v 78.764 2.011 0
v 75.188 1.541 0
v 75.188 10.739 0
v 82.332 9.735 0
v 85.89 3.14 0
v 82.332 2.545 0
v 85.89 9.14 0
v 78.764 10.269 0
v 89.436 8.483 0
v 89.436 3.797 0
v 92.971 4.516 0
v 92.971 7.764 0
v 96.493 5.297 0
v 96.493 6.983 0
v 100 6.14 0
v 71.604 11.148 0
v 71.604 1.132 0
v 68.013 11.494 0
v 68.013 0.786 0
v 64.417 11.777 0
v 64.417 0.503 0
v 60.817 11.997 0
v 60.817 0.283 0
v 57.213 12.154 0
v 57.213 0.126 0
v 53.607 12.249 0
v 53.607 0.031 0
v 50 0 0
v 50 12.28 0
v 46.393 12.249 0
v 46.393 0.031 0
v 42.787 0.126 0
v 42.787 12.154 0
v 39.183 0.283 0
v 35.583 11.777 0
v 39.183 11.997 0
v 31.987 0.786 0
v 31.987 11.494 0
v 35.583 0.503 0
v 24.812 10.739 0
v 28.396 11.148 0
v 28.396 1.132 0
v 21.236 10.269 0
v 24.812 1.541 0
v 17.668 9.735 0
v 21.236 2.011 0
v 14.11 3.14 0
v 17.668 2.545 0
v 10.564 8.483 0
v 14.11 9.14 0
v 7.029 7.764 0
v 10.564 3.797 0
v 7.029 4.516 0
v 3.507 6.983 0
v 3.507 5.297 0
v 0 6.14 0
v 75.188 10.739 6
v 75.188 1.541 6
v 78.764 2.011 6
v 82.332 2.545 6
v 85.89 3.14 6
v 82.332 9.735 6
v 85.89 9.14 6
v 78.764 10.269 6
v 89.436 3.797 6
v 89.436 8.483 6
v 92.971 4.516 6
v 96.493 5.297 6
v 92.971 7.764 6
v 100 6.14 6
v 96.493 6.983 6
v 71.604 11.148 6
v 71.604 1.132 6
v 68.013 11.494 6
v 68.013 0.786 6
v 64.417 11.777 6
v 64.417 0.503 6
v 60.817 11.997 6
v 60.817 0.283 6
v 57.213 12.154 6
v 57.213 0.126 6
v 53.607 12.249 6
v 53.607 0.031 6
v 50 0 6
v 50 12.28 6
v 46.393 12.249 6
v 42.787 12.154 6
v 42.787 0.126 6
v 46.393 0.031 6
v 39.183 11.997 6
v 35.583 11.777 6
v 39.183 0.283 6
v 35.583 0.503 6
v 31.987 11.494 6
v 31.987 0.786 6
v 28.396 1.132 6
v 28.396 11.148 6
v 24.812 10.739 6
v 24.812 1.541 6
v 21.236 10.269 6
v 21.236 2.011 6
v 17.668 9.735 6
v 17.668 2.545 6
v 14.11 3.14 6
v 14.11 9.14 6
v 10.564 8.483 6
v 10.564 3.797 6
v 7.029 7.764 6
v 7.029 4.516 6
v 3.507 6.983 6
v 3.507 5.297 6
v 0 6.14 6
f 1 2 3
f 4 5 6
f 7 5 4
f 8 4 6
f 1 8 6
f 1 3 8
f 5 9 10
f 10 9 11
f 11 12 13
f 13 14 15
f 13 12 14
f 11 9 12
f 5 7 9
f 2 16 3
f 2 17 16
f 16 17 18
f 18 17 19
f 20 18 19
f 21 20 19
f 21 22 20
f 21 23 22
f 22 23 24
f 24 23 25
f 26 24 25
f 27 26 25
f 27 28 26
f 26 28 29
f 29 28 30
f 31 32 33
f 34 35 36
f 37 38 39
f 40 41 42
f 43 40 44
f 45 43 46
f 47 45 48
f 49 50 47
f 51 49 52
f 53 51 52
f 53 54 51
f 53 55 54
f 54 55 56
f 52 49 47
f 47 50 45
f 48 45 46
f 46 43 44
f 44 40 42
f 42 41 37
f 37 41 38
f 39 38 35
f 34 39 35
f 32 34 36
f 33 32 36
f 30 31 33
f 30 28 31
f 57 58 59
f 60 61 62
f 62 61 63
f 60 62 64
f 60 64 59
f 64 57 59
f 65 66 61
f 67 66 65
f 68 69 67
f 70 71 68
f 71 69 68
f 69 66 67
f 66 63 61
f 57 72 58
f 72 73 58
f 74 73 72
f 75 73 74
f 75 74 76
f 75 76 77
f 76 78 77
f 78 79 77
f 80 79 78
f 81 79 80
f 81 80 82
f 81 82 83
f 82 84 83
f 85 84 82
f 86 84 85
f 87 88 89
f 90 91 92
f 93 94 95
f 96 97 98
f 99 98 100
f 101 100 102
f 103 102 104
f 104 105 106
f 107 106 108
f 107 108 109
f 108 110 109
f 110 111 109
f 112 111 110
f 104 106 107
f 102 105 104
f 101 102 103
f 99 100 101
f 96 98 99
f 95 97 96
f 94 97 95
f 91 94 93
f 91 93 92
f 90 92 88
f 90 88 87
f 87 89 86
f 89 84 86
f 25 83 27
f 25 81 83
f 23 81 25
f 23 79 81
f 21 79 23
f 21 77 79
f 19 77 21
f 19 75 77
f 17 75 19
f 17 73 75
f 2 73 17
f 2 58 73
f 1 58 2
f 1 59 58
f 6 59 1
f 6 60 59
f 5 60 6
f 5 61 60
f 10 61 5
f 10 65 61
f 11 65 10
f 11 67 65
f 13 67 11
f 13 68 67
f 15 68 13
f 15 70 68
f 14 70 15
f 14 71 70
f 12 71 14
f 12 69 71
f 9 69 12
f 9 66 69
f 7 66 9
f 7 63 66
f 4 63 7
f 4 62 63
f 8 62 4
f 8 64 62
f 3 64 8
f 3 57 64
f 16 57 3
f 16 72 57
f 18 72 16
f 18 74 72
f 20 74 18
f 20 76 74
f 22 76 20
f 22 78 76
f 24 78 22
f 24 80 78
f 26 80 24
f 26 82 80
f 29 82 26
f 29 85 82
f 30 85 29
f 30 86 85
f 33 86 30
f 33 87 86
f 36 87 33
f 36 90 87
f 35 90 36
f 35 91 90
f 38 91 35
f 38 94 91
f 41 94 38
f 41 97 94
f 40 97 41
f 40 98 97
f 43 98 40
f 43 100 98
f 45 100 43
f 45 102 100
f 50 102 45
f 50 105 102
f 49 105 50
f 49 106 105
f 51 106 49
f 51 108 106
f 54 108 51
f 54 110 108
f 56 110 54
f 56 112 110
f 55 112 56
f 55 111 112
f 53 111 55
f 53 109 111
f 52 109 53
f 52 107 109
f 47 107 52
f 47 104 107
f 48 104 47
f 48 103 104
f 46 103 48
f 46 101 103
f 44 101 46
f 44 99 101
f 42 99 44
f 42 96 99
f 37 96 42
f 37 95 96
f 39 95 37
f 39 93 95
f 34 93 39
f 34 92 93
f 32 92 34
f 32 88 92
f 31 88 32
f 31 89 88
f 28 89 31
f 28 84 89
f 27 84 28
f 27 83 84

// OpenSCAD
$fn = 32;

// ----------------------------------------------------------------------
// Arc profile plate: lens, 56 points
// ----------------------------------------------------------------------

// --- parameters (mm) ---
lens_chord = 100;         // chord length of the lens, X
arc_r = 206.68;           // radius of both arcs
arc_angle = 28;           // angle of each arc, degrees
sagitta = 6.14;           // bulge of each arc (half the lens height)
arc_step = 1;             // sampling step of the arcs, degrees
plate_t = 6;              // plate thickness, Z

bbox_y = 2 * sagitta;  // full lens height

profile = [[100, 6.14], [96.493, 6.983], [92.971, 7.764], [89.436, 8.483], [85.89, 9.14], [82.332, 9.735], [78.764, 10.269], [75.188, 10.739], [71.604, 11.148], [68.013, 11.494], [64.417, 11.777], [60.817, 11.997], [57.213, 12.154], [53.607, 12.249], [50, 12.28], [46.393, 12.249], [42.787, 12.154], [39.183, 11.997], [35.583, 11.777], [31.987, 11.494], [28.396, 11.148], [24.812, 10.739], [21.236, 10.269], [17.668, 9.735], [14.11, 9.14], [10.564, 8.483], [7.029, 7.764], [3.507, 6.983], [0, 6.14], [3.507, 5.297], [7.029, 4.516], [10.564, 3.797], [14.11, 3.14], [17.668, 2.545], [21.236, 2.011], [24.812, 1.541], [28.396, 1.132], [31.987, 0.786], [35.583, 0.503], [39.183, 0.283], [42.787, 0.126], [46.393, 0.031], [50, 0], [53.607, 0.031], [57.213, 0.126], [60.817, 0.283], [64.417, 0.503], [68.013, 0.786], [71.604, 1.132], [75.188, 1.541], [78.764, 2.011], [82.332, 2.545], [85.89, 3.14], [89.436, 3.797], [92.971, 4.516], [96.493, 5.297]];  // primary outline, 56 points, counter clockwise

// --- the one profile operation ---
linear_extrude(height = plate_t) polygon(points = profile);
